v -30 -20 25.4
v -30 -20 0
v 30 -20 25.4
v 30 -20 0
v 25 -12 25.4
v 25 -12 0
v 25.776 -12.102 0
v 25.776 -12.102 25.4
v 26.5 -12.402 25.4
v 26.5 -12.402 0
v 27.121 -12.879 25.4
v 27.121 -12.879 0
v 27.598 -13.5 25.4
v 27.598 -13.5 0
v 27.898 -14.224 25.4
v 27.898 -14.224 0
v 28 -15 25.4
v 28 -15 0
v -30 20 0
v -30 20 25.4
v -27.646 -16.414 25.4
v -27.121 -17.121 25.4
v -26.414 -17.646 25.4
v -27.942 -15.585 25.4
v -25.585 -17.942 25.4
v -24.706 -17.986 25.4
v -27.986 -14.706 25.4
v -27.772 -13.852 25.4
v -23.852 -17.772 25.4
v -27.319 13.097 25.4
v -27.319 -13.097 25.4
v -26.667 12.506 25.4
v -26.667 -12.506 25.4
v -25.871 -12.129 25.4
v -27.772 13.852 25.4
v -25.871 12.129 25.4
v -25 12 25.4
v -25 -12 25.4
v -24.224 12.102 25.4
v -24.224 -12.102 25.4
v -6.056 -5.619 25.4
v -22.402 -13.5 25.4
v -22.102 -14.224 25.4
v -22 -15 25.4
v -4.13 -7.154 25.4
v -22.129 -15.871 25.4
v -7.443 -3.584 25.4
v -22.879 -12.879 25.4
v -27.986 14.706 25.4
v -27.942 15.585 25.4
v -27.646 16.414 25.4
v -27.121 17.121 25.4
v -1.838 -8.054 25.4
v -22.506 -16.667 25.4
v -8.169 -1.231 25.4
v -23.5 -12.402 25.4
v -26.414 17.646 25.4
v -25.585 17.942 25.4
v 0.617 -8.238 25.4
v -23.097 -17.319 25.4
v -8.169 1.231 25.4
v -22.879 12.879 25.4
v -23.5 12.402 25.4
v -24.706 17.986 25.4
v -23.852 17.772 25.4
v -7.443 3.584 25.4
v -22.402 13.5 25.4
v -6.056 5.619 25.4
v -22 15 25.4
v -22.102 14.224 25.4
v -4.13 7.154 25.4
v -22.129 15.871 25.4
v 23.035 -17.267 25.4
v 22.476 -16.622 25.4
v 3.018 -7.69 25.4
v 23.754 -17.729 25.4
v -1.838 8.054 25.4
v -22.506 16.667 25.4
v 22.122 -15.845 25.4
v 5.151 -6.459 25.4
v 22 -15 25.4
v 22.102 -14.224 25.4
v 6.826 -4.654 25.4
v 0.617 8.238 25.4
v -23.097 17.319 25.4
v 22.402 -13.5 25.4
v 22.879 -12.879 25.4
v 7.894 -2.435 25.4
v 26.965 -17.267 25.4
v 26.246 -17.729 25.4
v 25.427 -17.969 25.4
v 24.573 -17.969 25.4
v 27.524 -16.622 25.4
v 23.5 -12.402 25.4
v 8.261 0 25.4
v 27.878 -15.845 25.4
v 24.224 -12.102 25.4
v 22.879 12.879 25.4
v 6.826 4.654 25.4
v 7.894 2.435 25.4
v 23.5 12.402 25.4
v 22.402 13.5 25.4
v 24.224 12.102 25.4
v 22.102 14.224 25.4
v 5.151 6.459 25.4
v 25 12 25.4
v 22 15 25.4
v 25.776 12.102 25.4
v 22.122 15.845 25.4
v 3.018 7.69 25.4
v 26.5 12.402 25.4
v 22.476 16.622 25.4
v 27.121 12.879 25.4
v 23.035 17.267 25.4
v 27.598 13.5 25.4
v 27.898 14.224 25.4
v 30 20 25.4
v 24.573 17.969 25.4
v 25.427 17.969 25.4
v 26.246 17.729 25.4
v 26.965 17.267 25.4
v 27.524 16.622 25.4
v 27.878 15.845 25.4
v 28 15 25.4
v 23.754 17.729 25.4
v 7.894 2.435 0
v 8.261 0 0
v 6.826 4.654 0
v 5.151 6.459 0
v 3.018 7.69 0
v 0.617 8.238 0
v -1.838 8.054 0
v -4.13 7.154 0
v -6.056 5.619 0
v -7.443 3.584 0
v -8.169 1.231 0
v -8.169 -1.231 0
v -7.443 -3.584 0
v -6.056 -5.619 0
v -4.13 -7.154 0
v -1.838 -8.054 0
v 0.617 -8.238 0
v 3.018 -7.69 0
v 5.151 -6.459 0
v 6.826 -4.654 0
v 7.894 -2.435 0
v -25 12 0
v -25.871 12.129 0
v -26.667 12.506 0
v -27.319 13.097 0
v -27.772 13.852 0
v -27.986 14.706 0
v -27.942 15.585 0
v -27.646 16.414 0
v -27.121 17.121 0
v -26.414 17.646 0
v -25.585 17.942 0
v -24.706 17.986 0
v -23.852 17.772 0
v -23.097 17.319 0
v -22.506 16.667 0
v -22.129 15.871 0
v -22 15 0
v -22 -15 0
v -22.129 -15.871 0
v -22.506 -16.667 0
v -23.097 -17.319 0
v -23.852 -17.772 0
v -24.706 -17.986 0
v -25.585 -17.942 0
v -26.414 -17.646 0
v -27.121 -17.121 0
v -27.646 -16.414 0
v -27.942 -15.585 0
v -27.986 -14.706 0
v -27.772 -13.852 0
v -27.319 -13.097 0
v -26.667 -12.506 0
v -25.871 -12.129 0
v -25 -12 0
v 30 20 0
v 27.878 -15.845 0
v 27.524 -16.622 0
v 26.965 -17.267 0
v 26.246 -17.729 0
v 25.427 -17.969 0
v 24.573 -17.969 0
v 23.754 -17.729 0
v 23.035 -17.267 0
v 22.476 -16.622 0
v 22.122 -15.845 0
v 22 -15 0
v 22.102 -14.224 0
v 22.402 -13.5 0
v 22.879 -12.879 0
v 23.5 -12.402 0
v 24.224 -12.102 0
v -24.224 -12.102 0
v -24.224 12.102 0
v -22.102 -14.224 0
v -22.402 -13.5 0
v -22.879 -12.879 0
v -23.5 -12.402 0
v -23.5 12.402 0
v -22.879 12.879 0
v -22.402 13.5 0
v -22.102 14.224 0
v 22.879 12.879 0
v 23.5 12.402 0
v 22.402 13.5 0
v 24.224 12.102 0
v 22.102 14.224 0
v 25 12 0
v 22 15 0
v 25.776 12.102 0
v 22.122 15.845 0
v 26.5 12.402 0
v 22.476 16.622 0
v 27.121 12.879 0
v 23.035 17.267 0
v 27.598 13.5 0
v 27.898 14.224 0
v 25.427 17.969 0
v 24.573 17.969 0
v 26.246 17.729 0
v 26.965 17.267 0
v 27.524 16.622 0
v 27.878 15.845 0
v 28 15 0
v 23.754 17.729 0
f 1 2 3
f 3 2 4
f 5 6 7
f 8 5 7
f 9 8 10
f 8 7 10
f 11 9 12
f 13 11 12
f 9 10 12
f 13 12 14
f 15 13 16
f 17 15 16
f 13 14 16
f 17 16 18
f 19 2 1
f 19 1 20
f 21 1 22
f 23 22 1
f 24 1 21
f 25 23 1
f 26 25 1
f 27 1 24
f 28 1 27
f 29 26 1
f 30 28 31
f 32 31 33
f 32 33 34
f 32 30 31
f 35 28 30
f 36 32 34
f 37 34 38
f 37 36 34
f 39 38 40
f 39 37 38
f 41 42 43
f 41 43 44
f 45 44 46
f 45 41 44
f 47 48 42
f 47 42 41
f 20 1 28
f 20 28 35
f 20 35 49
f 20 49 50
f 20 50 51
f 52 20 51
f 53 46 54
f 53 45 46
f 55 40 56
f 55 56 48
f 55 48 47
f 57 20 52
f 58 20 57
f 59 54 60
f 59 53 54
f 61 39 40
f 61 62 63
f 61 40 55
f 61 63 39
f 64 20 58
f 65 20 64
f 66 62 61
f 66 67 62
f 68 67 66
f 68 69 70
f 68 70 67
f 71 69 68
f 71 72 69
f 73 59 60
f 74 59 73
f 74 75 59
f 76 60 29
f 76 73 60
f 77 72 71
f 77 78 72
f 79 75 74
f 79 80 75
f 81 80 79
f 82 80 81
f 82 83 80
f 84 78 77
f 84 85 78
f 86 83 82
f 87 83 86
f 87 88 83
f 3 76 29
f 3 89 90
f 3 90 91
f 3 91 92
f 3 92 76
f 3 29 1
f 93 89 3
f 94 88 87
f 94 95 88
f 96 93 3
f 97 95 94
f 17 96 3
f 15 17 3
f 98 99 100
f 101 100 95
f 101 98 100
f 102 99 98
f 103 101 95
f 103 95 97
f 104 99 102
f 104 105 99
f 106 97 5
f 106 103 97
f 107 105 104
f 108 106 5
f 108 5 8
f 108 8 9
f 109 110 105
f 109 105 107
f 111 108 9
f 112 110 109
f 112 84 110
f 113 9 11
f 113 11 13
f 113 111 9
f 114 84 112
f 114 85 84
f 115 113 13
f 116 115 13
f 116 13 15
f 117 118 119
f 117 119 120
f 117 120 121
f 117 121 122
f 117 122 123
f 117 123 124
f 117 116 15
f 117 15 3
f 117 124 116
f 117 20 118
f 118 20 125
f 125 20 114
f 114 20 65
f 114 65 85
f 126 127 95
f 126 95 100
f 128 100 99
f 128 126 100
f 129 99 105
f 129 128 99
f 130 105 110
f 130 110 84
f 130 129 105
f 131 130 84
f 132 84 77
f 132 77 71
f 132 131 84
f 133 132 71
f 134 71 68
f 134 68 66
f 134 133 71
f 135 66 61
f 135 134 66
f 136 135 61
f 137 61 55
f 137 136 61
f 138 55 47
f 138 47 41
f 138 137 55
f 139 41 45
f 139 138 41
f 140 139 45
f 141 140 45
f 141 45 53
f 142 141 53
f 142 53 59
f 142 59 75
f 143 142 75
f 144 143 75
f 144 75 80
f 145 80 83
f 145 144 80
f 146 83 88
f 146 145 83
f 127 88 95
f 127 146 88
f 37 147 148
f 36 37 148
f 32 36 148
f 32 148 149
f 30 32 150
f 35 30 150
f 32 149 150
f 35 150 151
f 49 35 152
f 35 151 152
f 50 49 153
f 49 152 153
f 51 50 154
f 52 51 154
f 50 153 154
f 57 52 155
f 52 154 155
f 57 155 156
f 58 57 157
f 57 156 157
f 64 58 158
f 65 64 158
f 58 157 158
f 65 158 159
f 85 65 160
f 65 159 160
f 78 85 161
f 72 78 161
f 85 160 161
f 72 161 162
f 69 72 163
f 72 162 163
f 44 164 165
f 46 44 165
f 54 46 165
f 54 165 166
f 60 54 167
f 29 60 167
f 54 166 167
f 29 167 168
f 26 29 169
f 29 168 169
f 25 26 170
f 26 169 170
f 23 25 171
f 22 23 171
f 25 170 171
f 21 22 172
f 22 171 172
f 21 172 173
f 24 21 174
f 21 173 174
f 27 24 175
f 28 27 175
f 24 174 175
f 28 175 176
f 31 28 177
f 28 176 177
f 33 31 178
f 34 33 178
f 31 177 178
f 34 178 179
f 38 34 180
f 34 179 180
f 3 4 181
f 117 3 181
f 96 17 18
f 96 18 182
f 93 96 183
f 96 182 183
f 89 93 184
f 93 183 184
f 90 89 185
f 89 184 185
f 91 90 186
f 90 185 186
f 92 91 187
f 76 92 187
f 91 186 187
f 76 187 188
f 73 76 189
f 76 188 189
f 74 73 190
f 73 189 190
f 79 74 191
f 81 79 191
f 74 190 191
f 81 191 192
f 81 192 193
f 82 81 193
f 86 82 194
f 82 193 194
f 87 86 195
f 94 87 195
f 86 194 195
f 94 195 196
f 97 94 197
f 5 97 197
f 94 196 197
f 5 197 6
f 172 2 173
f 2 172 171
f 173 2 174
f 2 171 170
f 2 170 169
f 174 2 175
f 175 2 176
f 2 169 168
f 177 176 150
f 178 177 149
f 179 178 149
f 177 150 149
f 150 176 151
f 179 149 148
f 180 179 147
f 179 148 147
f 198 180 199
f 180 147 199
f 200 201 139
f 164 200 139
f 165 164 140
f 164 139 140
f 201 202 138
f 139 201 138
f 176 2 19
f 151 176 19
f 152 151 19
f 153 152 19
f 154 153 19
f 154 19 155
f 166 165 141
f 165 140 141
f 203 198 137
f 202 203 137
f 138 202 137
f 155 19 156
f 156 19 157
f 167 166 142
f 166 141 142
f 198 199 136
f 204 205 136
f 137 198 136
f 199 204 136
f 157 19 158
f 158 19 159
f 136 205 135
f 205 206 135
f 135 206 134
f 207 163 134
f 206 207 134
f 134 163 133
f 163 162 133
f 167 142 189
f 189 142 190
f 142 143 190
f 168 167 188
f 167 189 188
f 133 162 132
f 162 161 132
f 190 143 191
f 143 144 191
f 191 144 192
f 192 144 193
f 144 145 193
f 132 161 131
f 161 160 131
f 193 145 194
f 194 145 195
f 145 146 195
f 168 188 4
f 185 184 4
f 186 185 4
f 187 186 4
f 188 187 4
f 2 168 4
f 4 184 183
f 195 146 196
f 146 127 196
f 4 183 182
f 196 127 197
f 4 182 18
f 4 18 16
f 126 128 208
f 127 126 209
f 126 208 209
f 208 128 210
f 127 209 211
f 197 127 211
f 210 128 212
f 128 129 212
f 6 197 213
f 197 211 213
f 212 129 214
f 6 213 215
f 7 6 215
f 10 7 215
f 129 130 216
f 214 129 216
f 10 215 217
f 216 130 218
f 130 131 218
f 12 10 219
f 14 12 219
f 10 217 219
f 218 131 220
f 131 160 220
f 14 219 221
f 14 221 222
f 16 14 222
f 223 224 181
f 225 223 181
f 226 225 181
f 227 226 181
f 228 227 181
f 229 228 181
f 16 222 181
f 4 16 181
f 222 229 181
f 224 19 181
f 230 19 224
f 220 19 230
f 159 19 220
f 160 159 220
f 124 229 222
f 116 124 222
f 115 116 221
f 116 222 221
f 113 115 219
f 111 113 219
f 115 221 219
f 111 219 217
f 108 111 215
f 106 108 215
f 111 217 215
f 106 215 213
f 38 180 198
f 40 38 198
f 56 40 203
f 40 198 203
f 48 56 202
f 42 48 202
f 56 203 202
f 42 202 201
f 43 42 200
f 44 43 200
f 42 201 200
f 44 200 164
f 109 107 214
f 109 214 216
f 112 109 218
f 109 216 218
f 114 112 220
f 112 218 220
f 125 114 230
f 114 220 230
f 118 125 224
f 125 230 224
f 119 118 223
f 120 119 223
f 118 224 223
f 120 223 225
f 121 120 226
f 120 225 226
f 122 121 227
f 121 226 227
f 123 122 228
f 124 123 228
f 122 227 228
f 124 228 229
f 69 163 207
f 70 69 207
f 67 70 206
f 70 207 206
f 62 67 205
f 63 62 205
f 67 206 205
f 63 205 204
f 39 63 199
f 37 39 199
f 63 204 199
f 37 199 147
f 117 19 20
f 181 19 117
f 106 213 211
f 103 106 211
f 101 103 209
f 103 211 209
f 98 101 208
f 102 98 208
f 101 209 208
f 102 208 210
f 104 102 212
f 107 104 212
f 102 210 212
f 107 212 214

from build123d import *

# Parameters (mm, degrees)
F0_W     = 60
F0_H     = 40
F0_R     = 8.260965
F2_DEPTH = 25.4


with BuildPart() as f2:
    # F0 (on Top) → F2 (new body)
    with BuildSketch(Plane.XY):
        Rectangle(F0_W, F0_H)
        with BuildLine():
            ThreePointArc((-25, 12), (-27.12132, 17.12132), (-22, 15))
            Line((-22, 15), (22, 15))
            ThreePointArc((22, 15), (25, 18), (28, 15))
            ThreePointArc((28, 15), (27.12132, 12.87868), (25, 12))
            Line((25, 12), (25, -12))
            ThreePointArc((25, -12), (27.12132, -12.87868), (28, -15))
            ThreePointArc((28, -15), (25, -18), (22, -15))
            Line((22, -15), (-22, -15))
            ThreePointArc((-22, -15), (-27.12132, -17.12132), (-25, -12))
            Line((-25, -12), (-25, 12))
        make_face(mode=Mode.SUBTRACT)
        with BuildLine():
            Line((22, 15), (-22, 15))
            ThreePointArc((-22, 15), (-22.87868, 12.87868), (-25, 12))
            Line((-25, 12), (-25, -12))
            ThreePointArc((-25, -12), (-22.87868, -12.87868), (-22, -15))
            Line((-22, -15), (22, -15))
            ThreePointArc((22, -15), (22.87868, -12.87868), (25, -12))
            Line((25, -12), (25, 12))
            ThreePointArc((25, 12), (22.87868, 12.87868), (22, 15))
        make_face()
        Circle(F0_R, mode=Mode.SUBTRACT)
    extrude(amount=F2_DEPTH)


solid = f2.part
